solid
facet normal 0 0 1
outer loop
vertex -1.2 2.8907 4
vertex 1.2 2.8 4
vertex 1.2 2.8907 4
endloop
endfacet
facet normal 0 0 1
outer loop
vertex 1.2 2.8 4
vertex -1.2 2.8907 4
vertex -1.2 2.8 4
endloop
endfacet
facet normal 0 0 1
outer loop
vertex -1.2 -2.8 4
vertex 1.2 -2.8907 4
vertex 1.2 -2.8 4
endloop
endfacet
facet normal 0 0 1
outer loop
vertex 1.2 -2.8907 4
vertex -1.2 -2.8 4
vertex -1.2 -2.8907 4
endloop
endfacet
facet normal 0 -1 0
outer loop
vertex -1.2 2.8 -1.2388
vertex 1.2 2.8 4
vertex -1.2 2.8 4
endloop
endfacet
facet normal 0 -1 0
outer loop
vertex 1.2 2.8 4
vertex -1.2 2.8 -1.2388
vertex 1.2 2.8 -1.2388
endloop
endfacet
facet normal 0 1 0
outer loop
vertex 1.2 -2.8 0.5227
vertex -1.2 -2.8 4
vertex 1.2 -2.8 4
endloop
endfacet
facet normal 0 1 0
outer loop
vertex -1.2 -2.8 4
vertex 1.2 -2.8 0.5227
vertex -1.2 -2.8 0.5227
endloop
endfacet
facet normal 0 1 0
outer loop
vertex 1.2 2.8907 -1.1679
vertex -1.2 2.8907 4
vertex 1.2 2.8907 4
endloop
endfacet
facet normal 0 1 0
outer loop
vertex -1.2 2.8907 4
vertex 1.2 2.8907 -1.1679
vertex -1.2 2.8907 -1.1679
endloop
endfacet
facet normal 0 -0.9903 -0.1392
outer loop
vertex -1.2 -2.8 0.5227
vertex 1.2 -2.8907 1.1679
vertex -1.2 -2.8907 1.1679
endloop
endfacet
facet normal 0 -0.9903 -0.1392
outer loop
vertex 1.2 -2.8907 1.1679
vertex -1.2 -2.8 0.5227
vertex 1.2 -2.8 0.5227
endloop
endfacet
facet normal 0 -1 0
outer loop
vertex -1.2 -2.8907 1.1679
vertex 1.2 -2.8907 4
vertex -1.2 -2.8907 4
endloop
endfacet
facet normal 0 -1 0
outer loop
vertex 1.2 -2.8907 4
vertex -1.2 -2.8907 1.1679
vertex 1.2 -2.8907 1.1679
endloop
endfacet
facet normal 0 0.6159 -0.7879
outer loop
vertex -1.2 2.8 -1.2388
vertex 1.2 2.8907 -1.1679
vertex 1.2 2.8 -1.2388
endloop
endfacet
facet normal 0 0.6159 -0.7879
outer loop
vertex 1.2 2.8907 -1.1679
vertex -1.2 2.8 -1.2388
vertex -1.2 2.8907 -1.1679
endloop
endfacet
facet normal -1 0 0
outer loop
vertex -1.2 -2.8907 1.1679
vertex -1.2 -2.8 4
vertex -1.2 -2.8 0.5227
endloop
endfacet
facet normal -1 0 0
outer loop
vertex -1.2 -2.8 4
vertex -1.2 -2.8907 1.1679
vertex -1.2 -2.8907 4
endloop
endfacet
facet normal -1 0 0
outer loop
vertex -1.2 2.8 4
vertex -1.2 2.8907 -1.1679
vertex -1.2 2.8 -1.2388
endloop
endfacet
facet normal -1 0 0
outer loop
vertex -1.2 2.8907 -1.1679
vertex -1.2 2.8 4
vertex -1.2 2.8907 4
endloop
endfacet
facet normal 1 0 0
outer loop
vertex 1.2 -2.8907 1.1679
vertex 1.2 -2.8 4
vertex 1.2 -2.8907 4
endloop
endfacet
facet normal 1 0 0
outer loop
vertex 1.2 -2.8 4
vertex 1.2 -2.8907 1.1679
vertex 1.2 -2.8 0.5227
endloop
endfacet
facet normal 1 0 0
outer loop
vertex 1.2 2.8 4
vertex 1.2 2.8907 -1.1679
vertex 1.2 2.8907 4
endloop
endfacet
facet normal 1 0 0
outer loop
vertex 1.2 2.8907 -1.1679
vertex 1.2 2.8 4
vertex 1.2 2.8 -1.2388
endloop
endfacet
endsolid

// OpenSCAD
// The X adjust nuts must not spin: a real M3 nut (5.4 AF, measured) turned
// 8 deg, swept up through each slot's open top, must hit the walls of both
// x-slider adjust slots. Must render NON-empty.
include <../stage.scad>
af = 5.4;
xz = stage_base_h + xs_screw_z;
module x_swept(sx) hull() for (dz = [0, xs_h])
  translate([xs_xc + sx * (xs_len / 2 - 6), 0, xz + dz]) rotate([0, 90, 0]) rotate([0, 0, 8])
    cylinder(d = af / cos(30), h = 2.4, center = true, $fn = 6);
// each slot's hits, moved to a common point, must overlap
intersection() {
  translate([-(xs_xc - (xs_len / 2 - 6)), 0, -xz]) intersection() { stage_x_slider(); x_swept(-1); }
  translate([-(xs_xc + (xs_len / 2 - 6)), 0, -xz]) intersection() { stage_x_slider(); x_swept(1); }
}
